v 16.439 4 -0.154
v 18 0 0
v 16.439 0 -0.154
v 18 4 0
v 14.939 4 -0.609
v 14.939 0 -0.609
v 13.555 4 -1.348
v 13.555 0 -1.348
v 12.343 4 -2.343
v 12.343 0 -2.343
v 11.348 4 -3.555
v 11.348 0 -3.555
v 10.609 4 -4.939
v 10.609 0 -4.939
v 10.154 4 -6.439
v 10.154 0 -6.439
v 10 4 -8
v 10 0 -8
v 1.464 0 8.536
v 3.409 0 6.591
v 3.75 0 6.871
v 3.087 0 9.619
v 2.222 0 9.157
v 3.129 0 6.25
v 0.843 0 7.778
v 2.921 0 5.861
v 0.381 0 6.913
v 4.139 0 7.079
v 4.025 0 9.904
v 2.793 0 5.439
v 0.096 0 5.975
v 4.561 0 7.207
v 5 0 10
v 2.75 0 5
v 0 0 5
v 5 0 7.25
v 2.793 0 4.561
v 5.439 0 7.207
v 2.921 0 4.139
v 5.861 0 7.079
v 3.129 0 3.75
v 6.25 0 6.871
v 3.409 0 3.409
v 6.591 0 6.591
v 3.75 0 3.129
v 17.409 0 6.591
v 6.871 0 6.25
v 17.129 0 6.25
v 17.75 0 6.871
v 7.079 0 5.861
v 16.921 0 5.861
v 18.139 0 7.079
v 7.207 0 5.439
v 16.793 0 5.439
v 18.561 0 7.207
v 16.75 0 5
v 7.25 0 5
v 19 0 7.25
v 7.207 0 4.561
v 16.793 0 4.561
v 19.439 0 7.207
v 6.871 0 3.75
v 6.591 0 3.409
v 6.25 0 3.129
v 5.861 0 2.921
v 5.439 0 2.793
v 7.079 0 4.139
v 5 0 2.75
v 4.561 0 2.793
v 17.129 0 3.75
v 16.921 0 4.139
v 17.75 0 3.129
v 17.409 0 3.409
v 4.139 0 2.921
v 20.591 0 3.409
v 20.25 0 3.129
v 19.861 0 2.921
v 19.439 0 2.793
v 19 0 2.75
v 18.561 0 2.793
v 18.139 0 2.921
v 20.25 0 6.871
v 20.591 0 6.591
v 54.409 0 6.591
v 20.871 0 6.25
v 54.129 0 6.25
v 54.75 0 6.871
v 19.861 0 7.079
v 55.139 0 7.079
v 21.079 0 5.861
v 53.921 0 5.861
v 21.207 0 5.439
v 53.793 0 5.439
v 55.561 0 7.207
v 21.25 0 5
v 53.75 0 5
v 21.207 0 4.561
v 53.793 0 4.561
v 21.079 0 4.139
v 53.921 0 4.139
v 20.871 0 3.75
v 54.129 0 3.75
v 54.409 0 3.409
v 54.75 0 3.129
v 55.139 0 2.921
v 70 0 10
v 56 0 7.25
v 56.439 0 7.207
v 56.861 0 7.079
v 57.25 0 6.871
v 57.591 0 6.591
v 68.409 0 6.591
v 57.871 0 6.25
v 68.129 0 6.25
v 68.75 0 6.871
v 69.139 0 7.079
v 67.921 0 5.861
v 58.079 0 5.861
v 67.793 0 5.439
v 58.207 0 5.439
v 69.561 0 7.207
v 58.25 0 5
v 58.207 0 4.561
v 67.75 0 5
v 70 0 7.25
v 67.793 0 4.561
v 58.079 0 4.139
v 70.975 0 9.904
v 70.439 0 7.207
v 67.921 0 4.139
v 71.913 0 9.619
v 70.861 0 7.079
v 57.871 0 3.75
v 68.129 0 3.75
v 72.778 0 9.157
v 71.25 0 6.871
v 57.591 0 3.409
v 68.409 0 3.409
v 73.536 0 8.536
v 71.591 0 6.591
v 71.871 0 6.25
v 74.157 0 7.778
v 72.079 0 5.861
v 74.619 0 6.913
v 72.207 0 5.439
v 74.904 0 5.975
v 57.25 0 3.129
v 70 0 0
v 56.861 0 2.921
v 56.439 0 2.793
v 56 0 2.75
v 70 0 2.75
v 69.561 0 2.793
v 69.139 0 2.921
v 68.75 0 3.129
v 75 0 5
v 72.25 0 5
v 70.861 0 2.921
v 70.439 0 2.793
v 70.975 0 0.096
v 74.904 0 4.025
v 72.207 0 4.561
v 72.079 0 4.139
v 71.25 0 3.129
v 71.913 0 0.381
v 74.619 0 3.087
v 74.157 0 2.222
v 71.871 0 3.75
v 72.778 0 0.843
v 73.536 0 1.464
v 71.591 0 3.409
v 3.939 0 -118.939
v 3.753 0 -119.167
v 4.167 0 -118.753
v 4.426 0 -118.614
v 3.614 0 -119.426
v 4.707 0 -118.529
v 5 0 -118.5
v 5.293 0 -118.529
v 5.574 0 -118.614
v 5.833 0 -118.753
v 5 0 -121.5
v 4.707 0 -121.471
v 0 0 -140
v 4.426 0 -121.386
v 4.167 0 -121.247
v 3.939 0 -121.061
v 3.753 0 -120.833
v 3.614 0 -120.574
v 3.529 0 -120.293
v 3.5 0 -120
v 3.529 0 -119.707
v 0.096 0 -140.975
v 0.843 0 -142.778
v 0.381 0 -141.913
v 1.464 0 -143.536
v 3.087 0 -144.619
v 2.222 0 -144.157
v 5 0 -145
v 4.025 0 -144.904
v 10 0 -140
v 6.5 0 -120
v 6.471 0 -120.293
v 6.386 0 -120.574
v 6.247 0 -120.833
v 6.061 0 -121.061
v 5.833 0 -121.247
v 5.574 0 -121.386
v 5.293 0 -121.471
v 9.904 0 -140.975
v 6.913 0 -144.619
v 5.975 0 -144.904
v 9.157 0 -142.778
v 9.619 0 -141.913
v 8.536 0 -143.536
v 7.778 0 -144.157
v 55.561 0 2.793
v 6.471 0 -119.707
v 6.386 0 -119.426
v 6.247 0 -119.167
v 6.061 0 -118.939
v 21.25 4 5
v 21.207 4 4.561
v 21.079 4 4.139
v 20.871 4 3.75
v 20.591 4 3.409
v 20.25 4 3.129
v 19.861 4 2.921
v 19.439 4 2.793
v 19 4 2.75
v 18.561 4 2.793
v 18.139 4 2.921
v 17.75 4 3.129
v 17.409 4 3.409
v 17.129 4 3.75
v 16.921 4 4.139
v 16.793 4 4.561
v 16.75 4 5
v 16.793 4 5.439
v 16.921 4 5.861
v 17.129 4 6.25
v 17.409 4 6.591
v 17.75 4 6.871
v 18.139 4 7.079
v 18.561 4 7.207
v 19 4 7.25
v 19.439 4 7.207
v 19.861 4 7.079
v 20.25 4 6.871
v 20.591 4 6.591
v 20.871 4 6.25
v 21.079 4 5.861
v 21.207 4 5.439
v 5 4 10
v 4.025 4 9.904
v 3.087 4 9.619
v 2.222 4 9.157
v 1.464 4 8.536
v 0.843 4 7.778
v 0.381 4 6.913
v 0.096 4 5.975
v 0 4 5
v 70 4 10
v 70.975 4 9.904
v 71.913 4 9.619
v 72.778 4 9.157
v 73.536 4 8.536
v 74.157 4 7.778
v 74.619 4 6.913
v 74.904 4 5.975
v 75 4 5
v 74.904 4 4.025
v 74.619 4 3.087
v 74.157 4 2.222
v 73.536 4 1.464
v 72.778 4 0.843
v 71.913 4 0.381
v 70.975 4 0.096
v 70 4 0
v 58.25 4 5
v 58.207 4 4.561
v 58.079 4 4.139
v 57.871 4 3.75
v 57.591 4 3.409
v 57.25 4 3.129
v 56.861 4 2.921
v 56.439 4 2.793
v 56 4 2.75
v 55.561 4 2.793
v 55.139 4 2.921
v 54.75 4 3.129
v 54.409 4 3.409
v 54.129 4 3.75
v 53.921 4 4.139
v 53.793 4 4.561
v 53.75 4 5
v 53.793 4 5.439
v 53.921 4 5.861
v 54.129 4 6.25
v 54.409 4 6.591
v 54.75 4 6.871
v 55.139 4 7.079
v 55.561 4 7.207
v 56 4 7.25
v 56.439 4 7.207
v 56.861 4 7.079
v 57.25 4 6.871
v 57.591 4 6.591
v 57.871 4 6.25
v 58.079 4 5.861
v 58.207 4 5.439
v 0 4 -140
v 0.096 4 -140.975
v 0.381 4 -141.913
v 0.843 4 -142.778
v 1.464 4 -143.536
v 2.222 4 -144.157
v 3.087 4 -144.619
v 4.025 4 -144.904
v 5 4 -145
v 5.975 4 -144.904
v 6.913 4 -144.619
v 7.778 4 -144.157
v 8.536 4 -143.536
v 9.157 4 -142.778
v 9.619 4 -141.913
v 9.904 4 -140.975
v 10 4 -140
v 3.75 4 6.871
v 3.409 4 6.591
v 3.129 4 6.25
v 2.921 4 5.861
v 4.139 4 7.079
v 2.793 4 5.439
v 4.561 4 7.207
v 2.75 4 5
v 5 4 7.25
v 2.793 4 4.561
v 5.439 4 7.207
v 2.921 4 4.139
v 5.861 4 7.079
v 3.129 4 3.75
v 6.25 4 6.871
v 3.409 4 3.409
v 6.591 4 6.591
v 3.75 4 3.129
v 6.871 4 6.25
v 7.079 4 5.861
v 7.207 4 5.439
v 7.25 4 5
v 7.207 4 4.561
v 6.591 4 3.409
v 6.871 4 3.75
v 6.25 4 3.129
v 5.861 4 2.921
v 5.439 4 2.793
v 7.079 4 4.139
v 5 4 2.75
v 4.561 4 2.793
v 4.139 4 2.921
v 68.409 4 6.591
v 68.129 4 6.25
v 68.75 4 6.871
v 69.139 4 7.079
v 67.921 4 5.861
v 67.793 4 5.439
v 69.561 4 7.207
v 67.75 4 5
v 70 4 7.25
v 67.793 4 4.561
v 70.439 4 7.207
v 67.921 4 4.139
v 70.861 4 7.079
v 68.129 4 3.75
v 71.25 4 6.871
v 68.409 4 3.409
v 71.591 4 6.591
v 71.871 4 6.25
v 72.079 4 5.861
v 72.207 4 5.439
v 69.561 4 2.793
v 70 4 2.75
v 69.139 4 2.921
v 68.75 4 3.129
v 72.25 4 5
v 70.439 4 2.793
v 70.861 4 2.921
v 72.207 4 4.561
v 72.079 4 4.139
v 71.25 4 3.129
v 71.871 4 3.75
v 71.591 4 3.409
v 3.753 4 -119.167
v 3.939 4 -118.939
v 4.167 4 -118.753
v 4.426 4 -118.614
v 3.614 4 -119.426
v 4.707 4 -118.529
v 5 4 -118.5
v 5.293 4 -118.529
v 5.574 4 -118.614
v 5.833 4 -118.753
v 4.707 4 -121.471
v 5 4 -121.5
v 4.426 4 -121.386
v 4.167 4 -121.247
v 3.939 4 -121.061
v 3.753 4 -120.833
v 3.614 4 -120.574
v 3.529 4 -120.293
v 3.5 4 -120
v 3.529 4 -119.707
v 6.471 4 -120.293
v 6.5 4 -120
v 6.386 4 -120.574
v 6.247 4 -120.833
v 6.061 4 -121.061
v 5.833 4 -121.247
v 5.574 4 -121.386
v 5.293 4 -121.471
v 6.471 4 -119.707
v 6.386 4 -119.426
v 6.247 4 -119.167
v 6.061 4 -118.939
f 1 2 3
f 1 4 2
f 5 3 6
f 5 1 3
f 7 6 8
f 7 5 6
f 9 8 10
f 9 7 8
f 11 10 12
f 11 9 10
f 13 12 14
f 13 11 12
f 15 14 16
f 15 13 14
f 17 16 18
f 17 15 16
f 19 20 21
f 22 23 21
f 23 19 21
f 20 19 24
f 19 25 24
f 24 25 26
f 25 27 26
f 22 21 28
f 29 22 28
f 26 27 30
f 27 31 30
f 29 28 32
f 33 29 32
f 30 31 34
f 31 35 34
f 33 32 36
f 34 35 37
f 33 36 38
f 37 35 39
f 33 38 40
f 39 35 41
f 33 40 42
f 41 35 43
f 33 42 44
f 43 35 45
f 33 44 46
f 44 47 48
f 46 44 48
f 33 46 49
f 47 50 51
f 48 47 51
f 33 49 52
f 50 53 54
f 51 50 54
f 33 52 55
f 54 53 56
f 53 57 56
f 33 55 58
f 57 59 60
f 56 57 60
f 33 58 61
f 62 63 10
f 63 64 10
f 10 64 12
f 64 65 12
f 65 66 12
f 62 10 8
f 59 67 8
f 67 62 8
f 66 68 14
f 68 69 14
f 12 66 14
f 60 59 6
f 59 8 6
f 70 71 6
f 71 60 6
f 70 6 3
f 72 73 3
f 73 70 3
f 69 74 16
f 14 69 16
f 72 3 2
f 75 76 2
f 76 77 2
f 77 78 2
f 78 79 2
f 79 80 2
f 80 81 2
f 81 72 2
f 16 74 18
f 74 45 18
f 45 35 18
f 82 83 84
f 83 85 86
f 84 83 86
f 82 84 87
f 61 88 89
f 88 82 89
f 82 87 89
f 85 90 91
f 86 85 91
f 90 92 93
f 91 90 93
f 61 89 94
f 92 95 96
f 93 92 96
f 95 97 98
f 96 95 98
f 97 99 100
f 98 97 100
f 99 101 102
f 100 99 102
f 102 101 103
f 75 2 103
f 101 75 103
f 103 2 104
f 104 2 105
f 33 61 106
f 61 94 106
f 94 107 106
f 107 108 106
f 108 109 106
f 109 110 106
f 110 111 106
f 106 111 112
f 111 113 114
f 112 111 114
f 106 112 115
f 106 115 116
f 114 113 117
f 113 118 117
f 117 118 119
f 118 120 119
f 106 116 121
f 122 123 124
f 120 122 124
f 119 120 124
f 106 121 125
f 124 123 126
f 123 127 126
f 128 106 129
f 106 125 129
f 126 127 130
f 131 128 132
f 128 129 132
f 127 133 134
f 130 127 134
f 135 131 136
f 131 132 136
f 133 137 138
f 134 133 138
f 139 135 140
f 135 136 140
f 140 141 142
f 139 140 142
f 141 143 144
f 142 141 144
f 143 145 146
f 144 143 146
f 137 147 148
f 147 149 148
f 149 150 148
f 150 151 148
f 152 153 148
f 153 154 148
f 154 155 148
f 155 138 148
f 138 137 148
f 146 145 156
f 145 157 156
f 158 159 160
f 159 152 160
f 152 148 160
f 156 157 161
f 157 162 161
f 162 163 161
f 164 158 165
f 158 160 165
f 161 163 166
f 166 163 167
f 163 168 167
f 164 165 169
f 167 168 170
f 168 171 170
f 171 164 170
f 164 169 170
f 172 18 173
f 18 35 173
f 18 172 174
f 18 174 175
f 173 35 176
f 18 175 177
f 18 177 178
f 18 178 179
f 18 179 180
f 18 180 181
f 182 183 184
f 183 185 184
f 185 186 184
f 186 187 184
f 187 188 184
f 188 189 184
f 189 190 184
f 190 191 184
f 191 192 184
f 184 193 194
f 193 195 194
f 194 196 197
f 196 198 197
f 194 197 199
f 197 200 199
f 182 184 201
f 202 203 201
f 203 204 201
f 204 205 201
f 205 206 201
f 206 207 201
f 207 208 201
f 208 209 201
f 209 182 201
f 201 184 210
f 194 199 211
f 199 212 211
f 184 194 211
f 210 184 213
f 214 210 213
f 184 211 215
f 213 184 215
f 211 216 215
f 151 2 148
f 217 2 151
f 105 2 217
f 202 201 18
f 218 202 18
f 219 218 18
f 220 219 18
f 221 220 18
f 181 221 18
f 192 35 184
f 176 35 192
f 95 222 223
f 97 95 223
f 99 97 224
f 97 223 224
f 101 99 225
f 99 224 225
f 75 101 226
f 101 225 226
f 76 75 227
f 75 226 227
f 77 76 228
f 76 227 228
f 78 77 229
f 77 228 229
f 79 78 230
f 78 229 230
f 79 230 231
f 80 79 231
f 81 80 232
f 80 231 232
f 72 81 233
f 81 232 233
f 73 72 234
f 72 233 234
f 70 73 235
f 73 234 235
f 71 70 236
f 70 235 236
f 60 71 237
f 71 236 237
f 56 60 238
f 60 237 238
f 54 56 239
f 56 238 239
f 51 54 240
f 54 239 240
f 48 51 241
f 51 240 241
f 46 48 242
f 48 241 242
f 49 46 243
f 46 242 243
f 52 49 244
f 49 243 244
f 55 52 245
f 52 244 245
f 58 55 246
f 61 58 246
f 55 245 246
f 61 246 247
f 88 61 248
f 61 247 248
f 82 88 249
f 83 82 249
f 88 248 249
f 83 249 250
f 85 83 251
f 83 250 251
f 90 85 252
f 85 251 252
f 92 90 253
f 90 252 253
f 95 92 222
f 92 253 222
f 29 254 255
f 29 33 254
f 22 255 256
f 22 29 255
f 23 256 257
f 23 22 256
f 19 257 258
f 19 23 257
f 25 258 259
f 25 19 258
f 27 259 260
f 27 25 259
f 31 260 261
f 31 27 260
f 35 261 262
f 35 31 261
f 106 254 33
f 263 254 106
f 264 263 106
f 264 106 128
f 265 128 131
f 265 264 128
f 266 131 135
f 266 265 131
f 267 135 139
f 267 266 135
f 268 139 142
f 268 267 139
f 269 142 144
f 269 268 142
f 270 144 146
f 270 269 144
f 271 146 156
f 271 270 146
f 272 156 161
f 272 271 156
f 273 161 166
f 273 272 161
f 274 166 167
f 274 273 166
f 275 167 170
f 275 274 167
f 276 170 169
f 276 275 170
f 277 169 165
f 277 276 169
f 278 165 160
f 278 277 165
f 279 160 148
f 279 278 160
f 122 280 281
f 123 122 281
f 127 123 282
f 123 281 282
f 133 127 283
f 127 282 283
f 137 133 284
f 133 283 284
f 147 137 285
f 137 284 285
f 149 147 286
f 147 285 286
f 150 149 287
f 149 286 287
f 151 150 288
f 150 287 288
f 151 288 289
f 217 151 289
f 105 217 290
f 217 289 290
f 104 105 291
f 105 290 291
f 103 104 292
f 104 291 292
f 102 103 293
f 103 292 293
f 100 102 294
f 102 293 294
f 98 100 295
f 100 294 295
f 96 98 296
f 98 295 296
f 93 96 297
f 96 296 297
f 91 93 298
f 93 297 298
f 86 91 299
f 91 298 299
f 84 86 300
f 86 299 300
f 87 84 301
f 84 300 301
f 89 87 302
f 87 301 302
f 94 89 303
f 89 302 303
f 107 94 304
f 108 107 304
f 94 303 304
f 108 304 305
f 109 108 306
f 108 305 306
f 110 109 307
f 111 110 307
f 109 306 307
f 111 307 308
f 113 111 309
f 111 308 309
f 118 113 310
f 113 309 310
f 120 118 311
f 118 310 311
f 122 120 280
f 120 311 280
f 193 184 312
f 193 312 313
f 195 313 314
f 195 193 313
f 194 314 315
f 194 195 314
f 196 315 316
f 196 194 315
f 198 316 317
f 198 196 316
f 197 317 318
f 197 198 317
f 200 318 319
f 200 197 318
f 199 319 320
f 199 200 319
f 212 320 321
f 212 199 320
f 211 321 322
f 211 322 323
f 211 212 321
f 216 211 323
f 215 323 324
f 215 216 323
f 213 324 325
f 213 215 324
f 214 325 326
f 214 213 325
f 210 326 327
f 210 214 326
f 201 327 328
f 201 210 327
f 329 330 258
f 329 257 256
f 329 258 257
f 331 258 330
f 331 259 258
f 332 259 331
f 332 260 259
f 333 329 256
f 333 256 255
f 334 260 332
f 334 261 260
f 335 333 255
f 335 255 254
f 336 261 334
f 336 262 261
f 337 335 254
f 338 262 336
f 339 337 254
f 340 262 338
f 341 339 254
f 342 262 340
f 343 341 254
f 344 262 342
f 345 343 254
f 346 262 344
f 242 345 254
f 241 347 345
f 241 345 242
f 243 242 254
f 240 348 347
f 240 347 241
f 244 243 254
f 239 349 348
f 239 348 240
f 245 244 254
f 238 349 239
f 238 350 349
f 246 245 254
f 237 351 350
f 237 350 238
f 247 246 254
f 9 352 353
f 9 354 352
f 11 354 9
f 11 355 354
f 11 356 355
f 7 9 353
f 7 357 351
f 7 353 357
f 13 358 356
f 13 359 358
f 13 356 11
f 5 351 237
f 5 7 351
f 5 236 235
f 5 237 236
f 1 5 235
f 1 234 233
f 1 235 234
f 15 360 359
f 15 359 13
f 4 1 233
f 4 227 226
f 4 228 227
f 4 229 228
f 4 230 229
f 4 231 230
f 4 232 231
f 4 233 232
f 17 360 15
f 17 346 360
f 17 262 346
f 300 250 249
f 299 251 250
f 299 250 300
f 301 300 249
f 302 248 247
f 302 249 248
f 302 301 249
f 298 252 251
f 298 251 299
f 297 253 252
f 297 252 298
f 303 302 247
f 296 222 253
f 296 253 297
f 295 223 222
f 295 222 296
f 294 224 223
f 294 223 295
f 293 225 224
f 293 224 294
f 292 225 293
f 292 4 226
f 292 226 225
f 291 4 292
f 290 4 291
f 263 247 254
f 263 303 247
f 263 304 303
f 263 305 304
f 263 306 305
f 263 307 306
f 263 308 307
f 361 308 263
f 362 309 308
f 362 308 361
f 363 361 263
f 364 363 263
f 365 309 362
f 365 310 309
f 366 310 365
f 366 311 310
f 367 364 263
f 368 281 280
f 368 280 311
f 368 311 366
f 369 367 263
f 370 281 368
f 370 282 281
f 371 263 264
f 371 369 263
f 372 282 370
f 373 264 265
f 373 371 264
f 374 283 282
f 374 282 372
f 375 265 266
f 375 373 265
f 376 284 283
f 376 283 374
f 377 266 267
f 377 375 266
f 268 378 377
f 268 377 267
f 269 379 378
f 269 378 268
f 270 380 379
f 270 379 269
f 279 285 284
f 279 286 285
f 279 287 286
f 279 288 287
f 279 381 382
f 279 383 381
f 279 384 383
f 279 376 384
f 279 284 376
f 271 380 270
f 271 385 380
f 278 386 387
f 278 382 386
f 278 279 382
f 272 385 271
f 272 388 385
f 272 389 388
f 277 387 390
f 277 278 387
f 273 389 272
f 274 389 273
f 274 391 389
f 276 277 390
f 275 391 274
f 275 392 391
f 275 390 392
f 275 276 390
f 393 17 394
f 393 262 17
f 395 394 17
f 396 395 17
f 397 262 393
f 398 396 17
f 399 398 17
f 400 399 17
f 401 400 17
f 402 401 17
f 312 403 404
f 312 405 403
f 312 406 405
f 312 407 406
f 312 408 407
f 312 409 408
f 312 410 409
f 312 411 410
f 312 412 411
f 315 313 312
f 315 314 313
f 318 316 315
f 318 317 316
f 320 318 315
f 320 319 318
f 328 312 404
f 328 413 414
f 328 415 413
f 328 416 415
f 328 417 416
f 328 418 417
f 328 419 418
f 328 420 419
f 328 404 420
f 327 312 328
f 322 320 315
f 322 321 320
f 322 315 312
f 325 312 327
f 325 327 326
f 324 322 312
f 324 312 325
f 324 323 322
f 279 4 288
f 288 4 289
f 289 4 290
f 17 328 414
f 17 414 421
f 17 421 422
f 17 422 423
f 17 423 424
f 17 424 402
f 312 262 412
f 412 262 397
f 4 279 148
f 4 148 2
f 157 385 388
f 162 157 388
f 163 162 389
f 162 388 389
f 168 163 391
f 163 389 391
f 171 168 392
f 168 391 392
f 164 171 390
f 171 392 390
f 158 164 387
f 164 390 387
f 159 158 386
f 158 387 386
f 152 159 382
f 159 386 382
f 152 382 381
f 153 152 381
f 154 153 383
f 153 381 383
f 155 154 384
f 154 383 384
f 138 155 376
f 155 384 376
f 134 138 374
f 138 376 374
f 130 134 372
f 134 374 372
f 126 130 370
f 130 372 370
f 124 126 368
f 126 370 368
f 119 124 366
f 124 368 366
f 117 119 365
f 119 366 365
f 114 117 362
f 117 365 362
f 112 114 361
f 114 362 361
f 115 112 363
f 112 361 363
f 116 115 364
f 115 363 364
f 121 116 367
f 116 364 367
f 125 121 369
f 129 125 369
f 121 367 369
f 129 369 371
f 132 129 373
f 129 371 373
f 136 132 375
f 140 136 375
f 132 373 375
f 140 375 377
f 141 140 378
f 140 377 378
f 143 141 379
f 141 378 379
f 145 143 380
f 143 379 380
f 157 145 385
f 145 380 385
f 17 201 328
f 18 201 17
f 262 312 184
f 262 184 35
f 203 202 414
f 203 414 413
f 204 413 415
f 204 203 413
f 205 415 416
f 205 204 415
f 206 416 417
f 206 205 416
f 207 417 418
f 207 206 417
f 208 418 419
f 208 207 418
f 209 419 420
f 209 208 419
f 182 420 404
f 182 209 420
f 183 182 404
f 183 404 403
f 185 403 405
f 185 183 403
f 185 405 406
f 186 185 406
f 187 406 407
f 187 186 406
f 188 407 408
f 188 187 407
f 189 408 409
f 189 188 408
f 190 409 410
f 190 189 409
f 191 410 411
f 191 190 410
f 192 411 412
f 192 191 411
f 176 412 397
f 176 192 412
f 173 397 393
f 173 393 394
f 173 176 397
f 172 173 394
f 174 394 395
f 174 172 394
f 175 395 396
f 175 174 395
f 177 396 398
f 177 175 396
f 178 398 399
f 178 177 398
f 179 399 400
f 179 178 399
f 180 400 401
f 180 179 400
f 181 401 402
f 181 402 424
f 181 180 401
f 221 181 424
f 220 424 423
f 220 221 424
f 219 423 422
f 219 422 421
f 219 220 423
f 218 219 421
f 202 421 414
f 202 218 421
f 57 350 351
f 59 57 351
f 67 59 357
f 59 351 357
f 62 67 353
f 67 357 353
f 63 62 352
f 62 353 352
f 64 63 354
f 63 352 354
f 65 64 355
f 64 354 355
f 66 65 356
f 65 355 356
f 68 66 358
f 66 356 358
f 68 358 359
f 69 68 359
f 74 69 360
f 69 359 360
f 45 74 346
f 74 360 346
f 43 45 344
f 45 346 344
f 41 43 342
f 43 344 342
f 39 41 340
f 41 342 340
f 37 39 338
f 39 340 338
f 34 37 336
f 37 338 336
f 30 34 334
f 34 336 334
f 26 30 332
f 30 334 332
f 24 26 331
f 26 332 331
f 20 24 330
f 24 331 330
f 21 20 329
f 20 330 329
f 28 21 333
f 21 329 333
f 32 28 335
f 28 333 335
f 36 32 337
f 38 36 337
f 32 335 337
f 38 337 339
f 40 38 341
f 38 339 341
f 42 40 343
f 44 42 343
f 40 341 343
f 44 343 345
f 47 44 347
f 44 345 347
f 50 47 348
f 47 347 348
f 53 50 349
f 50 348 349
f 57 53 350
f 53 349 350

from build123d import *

# Parameters (mm, degrees)
SKETCH1_R           = 1.5
BOSS_EXTRUDE1_DEPTH = 4
SKETCH2_R           = 2.25
BOSS_EXTRUDE2_DEPTH = 4
FILLET1_R           = 8
FILLET2_R           = 5


with BuildPart() as part:
    # Sketch1 → Boss-Extrude1 (new body)
    with BuildSketch(Plane(origin=(0, 0, 0), x_dir=(1, 0, 0), z_dir=(0, 1, 0))):
        with BuildLine():
            Line((10, 140), (10, 0))
            Line((10, 0), (0, 0))
            Line((0, 0), (0, 140))
            ThreePointArc((0, 140), (5, 145), (10, 140))
        make_face()
        with Locations((5, 120)):
            Circle(SKETCH1_R, mode=Mode.SUBTRACT)
    extrude(amount=BOSS_EXTRUDE1_DEPTH)

    # Sketch2 → Boss-Extrude2 (add)
    with BuildSketch(Plane(origin=(0, 4, 0), x_dir=(1, 0, 0), z_dir=(0, 1, 0))):
        with BuildLine():
            Line((70, 0), (10, 0))
            Line((10, 0), (0, 0))
            Line((0, 0), (0, -10))
            Line((0, -10), (70, -10))
            ThreePointArc((70, -10), (75, -5), (70, 0))
        make_face()
        with Locations((5, -5)):
            Circle(SKETCH2_R, mode=Mode.SUBTRACT)
        with Locations((19, -5)):
            Circle(SKETCH2_R, mode=Mode.SUBTRACT)
        with Locations((56, -5)):
            Circle(SKETCH2_R, mode=Mode.SUBTRACT)
        with Locations((70, -5)):
            Circle(SKETCH2_R, mode=Mode.SUBTRACT)
    extrude(amount=-BOSS_EXTRUDE2_DEPTH)

    # Fillet1
    fillet1_edges = [part.edges().sort_by_distance(p)[0] for p in [
        (10, 2, 0),
    ]]
    fillet(fillet1_edges, radius=FILLET1_R)

    # Fillet2
    fillet2_edges = [part.edges().sort_by_distance(p)[0] for p in [
        (0, 2, 10),
    ]]
    fillet(fillet2_edges, radius=FILLET2_R)


solid = part.part
